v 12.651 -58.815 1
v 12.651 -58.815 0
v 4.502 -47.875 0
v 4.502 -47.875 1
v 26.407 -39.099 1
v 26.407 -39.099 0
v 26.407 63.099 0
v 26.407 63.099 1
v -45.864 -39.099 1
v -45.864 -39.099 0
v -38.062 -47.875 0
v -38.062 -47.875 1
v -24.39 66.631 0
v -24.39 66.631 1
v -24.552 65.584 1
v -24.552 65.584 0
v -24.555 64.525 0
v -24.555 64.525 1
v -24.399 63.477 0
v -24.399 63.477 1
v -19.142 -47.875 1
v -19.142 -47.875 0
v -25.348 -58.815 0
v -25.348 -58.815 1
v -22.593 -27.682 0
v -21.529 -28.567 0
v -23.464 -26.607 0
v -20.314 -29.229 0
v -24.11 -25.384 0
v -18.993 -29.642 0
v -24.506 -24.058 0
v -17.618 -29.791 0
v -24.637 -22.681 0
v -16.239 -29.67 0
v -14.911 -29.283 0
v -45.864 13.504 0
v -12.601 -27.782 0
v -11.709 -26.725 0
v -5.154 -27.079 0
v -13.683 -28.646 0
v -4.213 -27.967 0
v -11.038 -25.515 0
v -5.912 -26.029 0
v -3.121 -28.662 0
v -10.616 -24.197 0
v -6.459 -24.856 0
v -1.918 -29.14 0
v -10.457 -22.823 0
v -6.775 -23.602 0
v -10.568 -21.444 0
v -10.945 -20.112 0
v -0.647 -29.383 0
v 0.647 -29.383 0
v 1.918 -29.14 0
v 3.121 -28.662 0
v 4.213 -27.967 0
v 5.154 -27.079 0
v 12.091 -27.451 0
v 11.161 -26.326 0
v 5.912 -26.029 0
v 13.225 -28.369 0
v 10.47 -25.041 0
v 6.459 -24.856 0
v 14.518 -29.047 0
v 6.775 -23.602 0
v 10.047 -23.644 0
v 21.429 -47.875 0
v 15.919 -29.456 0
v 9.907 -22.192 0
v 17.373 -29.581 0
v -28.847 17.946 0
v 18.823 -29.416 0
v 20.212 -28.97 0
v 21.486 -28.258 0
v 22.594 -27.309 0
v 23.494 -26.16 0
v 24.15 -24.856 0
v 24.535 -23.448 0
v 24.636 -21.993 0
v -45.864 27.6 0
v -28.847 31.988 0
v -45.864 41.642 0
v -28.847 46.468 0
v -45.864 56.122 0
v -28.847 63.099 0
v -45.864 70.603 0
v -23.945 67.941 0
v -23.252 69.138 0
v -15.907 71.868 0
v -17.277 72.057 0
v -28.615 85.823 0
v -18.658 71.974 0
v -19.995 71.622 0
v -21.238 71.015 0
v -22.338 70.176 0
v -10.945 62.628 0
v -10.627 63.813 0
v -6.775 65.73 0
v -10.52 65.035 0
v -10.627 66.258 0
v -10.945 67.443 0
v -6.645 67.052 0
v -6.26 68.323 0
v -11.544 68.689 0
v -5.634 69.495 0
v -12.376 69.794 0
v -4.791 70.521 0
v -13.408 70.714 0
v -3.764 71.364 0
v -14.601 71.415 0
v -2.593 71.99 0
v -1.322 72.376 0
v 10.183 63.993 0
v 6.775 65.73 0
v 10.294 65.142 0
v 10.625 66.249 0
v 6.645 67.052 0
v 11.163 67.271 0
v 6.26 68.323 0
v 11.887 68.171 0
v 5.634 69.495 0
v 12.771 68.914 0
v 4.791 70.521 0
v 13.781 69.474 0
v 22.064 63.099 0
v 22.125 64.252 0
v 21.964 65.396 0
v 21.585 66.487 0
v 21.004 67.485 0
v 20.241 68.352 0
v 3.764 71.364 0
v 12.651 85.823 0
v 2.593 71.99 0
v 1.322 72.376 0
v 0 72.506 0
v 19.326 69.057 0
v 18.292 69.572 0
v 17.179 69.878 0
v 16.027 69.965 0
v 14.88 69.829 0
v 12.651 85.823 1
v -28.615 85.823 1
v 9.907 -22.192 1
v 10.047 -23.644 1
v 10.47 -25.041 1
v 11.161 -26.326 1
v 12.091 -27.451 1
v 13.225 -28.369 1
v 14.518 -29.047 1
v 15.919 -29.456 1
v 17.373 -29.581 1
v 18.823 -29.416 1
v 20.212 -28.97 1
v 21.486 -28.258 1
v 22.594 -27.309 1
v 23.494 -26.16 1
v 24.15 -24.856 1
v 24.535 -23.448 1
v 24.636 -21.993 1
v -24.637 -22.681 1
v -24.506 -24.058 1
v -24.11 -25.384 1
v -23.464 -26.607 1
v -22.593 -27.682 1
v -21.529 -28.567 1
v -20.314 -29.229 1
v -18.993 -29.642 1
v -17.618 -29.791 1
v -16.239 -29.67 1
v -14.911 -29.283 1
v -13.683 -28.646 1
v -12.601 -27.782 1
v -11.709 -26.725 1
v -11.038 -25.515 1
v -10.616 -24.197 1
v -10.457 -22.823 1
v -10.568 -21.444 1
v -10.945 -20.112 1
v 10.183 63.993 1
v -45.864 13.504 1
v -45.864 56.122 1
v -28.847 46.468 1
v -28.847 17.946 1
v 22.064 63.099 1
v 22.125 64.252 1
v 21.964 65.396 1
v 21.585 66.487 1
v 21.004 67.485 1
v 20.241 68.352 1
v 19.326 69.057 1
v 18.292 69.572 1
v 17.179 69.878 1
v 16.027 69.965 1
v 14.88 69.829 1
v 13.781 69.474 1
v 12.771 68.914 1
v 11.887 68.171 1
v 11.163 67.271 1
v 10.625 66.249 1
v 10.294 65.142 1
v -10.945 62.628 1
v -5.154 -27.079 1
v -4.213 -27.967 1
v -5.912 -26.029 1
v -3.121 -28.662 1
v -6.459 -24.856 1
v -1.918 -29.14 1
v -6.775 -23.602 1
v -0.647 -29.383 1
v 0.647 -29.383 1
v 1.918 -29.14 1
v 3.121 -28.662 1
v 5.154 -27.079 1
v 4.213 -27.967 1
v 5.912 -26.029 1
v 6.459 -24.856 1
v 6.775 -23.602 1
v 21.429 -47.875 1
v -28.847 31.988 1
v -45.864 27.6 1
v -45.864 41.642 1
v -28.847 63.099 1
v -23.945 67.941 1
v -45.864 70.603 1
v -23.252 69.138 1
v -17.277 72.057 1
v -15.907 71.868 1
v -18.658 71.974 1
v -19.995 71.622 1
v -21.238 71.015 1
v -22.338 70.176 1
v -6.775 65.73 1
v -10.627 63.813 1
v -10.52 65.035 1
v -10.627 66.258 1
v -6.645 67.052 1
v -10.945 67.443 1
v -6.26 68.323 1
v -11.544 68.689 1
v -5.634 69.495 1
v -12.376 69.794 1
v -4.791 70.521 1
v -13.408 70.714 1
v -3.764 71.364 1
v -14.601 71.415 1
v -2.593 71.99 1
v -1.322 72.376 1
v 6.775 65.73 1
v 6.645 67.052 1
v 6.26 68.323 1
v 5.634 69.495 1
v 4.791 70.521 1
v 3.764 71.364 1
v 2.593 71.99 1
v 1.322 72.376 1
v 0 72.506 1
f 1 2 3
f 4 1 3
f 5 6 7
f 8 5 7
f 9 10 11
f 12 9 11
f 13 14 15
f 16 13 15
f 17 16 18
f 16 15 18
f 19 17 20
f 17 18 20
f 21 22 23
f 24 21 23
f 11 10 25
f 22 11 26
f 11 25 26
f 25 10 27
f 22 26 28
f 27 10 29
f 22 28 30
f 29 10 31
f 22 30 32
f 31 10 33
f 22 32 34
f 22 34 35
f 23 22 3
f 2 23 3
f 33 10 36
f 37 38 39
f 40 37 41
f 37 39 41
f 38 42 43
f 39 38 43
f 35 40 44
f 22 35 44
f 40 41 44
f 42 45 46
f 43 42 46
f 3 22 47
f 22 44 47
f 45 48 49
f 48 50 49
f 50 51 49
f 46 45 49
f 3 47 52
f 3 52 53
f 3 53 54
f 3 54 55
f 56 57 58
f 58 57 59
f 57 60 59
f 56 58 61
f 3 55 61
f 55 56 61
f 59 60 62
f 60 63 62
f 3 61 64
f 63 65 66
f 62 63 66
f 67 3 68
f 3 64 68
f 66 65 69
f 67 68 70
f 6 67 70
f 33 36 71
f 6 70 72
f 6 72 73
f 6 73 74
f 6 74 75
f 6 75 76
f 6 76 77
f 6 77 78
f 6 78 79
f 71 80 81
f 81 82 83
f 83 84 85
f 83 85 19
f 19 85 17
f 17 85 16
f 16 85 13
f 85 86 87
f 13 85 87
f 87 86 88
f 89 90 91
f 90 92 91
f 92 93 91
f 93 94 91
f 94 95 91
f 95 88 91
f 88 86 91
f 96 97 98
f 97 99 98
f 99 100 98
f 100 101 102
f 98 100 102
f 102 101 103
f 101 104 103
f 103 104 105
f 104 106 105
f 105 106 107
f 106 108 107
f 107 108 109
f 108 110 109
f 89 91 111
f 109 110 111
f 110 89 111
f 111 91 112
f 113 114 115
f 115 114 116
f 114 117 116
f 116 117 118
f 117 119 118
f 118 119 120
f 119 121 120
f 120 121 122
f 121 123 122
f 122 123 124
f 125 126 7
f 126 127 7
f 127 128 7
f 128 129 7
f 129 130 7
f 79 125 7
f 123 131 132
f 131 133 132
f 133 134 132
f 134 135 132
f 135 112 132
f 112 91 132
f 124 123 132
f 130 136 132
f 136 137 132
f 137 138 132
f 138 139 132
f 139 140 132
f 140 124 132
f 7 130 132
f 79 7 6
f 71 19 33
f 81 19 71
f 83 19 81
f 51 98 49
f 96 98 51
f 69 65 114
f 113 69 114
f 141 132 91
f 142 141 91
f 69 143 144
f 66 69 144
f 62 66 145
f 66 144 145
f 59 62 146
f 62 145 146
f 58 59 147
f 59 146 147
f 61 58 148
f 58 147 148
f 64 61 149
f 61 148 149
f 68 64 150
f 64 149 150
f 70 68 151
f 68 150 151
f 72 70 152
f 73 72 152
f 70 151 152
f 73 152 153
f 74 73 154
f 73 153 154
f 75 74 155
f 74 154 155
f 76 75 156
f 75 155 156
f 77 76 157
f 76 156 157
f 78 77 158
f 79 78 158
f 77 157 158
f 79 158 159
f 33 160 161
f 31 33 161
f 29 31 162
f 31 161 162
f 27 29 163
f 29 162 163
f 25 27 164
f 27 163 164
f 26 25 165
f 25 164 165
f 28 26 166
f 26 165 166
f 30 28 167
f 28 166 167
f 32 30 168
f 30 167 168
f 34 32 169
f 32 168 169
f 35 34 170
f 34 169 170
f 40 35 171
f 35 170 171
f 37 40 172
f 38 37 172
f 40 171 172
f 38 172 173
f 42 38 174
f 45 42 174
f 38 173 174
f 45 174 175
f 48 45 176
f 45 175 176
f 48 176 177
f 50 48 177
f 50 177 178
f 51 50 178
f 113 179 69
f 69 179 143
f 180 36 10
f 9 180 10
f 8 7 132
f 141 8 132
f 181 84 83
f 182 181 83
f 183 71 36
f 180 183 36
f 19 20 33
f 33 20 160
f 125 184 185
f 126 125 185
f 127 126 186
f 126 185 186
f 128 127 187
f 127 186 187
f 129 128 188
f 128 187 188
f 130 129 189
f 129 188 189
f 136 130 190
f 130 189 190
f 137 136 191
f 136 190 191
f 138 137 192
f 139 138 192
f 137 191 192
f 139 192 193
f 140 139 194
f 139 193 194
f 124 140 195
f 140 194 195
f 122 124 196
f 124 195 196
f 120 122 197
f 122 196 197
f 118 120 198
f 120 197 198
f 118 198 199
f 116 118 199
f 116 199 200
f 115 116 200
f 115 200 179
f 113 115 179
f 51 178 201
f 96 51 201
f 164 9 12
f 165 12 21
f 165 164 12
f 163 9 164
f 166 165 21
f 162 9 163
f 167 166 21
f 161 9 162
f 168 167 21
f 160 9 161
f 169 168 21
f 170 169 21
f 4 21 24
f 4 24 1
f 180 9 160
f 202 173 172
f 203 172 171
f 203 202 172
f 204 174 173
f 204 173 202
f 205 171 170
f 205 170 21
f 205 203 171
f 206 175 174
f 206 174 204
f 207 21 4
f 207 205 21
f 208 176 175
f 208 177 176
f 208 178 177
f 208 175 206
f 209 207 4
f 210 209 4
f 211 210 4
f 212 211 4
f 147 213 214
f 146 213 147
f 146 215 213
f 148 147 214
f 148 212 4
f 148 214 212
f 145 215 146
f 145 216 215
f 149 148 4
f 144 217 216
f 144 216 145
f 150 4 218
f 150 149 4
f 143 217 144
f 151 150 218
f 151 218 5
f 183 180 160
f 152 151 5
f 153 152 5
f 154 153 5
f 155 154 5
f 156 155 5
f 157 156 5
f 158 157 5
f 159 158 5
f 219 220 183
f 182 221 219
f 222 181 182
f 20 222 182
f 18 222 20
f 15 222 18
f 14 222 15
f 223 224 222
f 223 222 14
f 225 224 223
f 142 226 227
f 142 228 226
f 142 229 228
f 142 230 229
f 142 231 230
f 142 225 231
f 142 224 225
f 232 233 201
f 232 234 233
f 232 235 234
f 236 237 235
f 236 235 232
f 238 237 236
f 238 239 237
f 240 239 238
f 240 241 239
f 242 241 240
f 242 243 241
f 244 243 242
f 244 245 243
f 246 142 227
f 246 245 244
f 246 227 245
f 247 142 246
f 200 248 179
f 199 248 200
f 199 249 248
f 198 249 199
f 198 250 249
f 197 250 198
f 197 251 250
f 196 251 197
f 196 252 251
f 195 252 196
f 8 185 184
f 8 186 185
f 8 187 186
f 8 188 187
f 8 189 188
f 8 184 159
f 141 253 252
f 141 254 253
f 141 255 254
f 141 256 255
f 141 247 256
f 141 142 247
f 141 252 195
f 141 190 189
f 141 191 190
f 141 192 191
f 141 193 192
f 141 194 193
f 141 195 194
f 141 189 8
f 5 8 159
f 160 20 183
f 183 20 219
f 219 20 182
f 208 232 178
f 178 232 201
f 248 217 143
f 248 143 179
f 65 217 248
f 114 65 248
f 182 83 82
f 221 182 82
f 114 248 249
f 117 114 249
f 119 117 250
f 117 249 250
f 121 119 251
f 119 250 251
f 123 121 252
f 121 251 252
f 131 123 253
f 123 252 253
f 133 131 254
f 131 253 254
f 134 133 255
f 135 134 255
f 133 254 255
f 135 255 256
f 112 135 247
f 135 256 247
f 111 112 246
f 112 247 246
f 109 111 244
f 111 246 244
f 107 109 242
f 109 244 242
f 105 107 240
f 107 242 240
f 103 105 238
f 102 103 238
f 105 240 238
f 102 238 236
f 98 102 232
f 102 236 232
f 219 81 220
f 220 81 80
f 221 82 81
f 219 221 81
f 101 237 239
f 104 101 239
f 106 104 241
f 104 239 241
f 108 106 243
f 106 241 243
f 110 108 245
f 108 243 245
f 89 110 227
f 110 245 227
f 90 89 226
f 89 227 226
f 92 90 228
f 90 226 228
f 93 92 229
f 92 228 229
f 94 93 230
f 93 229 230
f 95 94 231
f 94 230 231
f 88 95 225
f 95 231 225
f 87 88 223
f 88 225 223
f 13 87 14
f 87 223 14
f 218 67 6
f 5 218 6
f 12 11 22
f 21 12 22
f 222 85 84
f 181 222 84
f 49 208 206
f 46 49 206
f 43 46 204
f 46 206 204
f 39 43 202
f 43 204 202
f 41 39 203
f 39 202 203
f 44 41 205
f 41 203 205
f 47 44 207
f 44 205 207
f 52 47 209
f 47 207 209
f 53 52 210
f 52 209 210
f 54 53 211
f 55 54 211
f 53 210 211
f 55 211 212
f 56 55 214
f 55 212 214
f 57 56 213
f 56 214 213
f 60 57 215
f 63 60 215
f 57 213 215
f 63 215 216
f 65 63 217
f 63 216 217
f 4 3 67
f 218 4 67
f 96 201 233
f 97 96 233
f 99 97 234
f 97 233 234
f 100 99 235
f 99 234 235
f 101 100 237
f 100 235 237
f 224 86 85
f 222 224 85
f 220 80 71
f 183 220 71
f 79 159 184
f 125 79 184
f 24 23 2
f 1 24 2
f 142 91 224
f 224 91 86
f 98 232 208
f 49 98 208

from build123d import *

# Parameters (mm, degrees)
F1_DEPTH = 1
F3_DEPTH = 1


with BuildPart() as f1:
    # F0 (on Top) → F1 (new body)
    with BuildSketch(Plane.XY):
        Polygon((12.651404, 85.822819), (-28.614573, 85.822819), (-45.86415, 70.602764), (-28.846802, 63.09859), (-45.86415, 56.122149), (-28.846802, 46.468406), (-45.86415, 41.641531), (-28.846802, 31.987788), (-45.86415, 27.599723), (-28.846802, 17.94598), (-45.86415, 13.503664), (-45.86415, -39.098875), (-38.06174, -47.875002), (-19.141939, -47.875002), (-25.34835, -58.81549), (12.651404, -58.81549), (4.502493, -47.875002), (21.428692, -47.875002), (26.407287, -39.098875), (26.407287, 63.09859), align=None)
    extrude(amount=F1_DEPTH)

    # F2 (on face) → F3 (cut)
    with BuildSketch(Plane.XY.offset(1)):
        with BuildLine():
            Line((-10.944886, 67.442728), (-10.944886, 62.627868))
            ThreePointArc((-10.944886, 62.627868), (-10.519625, 65.035298), (-10.944886, 67.442728))
        make_face()
        with BuildLine():
            Line((-10.944886, -20.112349), (-10.944886, 62.627868))
            Line((-10.944886, 62.627868), (-10.944886, 67.442728))
            ThreePointArc((-10.944886, 67.442728), (-17.969793, 72.049479), (-24.389813, 66.631471))
            Line((-24.389813, 66.631471), (-24.398557, 63.477087))
            Line((-24.398557, 63.477087), (-24.637369, -22.680704))
            ThreePointArc((-24.637369, -22.680704), (-16.239304, -29.669648), (-10.944886, -20.112349))
        make_face()
        with BuildLine():
            Line((-24.398557, 63.477087), (-24.389813, 66.631471))
            ThreePointArc((-24.389813, 66.631471), (-24.573473, 65.054776), (-24.398557, 63.477087))
        make_face()
        with BuildLine():
            Line((-6.775405, 65.73049), (-6.775405, -23.601575))
            ThreePointArc((-6.775405, -23.601575), (0, -29.413971), (6.775405, -23.601575))
            Line((6.775405, -23.601575), (6.775405, 65.73049))
            ThreePointArc((6.775405, 65.73049), (0, 72.505895), (-6.775405, 65.73049))
        make_face()
        with BuildLine():
            Line((10.182706, 63.992515), (9.907027, -22.191573))
            ThreePointArc((9.907027, -22.191573), (17.372692, -29.580637), (24.635973, -21.992544))
            Line((24.635973, -21.992544), (22.063504, 63.09859))
            ThreePointArc((22.063504, 63.09859), (16.604961, 69.949706), (10.182706, 63.992515))
        make_face()
    extrude(amount=-F3_DEPTH, mode=Mode.SUBTRACT)


solid = f1.part
